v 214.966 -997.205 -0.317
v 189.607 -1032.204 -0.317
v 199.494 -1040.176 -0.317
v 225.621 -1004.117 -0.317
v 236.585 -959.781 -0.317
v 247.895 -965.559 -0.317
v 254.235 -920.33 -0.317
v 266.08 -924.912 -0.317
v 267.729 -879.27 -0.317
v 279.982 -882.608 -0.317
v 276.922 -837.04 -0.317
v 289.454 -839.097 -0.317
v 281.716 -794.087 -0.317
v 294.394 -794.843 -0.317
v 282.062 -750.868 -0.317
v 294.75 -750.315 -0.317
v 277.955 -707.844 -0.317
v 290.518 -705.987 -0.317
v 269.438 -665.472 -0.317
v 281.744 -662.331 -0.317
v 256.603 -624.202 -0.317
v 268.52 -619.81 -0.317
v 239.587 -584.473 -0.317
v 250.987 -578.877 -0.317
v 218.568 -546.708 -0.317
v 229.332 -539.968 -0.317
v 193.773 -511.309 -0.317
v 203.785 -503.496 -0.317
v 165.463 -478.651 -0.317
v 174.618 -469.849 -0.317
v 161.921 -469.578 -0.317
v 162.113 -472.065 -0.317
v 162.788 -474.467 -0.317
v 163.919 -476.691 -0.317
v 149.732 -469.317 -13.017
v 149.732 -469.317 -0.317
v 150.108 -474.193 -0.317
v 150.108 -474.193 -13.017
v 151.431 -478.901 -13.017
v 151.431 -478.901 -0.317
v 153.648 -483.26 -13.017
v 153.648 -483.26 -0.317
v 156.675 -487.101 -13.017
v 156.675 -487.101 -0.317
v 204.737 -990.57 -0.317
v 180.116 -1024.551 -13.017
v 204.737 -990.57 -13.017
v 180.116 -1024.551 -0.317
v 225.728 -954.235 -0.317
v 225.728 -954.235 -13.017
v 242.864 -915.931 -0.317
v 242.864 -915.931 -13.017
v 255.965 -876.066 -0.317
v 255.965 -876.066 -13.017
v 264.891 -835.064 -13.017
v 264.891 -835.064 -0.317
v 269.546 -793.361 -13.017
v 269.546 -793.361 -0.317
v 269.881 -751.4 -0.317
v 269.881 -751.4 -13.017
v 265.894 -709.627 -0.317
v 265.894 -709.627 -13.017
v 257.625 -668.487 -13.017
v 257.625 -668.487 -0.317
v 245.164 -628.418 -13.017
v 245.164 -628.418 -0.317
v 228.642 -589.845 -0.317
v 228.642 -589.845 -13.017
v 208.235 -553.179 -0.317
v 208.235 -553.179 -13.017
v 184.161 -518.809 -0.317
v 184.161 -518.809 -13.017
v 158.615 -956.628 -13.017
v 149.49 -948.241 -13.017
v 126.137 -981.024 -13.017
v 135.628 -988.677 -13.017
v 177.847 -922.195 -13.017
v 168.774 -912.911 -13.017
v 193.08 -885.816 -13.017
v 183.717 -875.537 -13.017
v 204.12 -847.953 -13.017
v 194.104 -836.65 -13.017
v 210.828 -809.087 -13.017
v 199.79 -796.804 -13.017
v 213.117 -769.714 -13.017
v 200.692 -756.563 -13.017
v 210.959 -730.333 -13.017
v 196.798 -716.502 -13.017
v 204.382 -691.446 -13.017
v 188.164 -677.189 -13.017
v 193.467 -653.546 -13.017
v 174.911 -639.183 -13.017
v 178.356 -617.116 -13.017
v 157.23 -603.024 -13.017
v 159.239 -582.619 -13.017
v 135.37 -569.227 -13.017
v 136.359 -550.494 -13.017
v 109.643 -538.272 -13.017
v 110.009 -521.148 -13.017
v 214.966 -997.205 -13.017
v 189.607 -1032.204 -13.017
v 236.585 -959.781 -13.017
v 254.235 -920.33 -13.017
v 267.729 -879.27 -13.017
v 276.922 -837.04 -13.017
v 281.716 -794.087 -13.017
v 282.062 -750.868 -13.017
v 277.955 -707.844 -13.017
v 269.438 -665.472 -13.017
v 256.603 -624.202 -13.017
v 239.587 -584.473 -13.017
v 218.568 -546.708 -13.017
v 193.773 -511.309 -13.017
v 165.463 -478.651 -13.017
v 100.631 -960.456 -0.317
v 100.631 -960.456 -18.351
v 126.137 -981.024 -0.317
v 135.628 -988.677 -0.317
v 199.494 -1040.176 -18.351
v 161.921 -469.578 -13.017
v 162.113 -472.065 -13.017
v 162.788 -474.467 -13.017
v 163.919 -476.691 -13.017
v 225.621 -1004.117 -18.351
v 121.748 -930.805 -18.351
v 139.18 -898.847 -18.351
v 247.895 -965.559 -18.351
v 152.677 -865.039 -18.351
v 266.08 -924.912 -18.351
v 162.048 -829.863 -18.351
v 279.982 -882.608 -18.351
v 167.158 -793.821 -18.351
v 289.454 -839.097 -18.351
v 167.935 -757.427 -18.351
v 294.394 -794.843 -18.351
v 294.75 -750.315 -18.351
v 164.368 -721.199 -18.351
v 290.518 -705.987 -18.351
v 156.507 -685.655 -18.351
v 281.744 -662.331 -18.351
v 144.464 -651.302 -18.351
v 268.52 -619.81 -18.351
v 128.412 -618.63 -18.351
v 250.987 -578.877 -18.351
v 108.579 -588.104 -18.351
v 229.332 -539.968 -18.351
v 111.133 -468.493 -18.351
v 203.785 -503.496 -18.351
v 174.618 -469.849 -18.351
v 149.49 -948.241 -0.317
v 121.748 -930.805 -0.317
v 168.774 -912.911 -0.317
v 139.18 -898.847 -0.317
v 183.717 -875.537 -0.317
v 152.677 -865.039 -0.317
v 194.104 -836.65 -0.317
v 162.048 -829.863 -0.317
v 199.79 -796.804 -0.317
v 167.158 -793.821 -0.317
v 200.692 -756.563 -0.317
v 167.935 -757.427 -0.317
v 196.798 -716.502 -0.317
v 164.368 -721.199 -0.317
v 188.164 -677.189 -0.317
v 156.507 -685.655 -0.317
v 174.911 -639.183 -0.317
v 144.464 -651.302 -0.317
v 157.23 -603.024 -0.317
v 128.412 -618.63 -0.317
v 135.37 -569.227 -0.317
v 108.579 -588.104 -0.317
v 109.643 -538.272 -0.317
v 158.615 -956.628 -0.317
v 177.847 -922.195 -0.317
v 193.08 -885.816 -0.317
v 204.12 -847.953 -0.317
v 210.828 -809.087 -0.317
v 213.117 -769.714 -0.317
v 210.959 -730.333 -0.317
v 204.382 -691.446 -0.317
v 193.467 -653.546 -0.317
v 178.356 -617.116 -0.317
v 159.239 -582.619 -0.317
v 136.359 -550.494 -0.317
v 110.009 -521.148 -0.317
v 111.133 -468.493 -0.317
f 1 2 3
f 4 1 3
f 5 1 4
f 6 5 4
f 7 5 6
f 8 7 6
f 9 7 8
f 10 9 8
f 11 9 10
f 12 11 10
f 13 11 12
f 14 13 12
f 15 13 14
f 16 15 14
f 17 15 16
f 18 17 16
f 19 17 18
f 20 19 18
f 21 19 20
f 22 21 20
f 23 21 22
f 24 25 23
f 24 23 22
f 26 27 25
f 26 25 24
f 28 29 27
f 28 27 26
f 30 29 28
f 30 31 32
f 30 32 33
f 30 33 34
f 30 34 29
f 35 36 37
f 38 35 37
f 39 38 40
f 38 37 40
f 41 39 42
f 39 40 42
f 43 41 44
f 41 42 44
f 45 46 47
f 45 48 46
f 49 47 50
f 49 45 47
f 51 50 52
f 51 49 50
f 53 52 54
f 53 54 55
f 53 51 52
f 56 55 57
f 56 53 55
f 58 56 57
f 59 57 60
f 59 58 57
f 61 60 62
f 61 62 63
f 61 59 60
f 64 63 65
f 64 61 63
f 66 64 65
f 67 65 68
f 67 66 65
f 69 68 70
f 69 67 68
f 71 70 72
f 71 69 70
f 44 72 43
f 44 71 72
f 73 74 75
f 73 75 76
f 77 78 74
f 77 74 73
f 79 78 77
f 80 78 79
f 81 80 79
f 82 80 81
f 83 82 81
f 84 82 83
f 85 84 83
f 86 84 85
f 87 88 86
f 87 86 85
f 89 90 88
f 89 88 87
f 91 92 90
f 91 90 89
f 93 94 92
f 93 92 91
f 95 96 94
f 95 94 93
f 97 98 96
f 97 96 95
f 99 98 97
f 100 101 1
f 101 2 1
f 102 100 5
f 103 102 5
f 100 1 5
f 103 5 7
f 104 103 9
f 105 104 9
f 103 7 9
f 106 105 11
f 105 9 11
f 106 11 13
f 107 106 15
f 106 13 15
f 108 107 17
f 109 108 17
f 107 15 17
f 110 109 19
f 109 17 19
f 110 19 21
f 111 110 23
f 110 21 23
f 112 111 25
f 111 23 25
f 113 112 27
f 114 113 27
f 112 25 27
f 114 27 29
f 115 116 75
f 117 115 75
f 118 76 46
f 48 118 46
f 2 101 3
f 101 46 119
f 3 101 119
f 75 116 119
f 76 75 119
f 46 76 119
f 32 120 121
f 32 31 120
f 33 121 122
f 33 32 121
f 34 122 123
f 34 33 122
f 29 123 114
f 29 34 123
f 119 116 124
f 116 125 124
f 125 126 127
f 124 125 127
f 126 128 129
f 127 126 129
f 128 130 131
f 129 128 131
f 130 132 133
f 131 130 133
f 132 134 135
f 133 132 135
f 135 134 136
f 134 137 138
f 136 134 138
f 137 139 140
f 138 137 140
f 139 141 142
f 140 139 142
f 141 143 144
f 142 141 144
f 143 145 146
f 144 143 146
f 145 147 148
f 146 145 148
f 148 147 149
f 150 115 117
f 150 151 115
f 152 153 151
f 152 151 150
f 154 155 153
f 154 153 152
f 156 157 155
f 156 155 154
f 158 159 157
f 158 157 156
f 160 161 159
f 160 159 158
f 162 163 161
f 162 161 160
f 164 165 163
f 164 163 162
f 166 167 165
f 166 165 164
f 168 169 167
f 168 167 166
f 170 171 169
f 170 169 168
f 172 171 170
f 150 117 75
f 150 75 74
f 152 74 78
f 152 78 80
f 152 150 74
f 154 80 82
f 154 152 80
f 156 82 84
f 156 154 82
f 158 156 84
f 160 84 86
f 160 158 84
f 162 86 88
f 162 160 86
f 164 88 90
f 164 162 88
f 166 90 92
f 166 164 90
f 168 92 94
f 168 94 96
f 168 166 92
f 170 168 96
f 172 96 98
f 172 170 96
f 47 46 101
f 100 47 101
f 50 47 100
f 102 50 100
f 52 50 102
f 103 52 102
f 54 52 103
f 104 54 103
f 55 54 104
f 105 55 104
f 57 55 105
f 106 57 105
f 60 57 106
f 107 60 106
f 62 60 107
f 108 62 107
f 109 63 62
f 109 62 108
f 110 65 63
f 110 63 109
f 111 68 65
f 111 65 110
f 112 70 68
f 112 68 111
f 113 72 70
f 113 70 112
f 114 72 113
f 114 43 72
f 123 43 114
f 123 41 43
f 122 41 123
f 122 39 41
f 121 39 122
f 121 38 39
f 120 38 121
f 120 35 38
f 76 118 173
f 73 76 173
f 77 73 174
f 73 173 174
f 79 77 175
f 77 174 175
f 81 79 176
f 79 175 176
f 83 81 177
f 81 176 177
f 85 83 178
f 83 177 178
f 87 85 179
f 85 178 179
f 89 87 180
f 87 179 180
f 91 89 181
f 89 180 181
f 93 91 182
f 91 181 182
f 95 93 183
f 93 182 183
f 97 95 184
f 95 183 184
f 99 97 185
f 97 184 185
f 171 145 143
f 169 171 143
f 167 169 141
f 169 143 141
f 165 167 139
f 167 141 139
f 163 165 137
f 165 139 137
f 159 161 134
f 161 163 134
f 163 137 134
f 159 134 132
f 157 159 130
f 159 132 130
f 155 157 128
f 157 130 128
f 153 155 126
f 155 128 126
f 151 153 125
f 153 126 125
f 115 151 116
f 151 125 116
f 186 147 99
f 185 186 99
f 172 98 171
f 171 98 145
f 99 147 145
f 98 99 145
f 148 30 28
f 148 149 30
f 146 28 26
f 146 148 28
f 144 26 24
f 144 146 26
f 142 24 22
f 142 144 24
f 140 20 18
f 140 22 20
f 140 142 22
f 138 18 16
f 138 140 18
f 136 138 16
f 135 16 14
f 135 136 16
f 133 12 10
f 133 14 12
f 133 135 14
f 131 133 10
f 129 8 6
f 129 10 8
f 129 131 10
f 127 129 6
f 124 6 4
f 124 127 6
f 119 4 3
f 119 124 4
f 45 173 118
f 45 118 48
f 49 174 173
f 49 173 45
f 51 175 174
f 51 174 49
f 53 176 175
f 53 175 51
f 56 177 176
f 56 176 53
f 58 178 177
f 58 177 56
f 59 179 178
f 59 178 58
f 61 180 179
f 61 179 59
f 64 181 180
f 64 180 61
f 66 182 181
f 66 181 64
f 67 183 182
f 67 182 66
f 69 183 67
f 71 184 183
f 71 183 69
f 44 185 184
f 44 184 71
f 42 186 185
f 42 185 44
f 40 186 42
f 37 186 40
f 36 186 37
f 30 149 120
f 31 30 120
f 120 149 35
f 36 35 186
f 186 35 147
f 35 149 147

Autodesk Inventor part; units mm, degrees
ref_plane "YZ Plane" through (0, 0, 0) normal (1, 0, 0) x (0, 1, 0)
ref_plane "XZ Plane" through (0, 0, 0) normal (0, 1, 0) x (-1, 0, 0)
ref_plane "Work Plane1" through (22.5184, 2.463, -18.3509) normal (0, 0, 1) x (0.9997722, -0.0213418, 0)
sketch "ThermoBulbBorder" plane through (22.5184, 2.463, -18.3509) normal (0, 0, 1) x (0.9997722, -0.0213418, 0)
  arc A0 (-447.455, -468.958) -> (162.145, -468.958) centre (-142.655, -774.8145) ccw
  arc A1 (-447.455, -468.958) -> (162.145, -468.958) centre (-142.655, -774.8145) ccw
  arc A2 (-383.955, -588.5959) -> (98.645, -588.5959) centre (-142.655, -774.8145) ccw
  line L0 (-447.455, -468.958) -> (-383.955, -468.958)
  line L1 (-383.955, -468.958) -> (-383.955, -588.5959)
  line L2 (162.145, -468.958) -> (98.645, -468.958)
  line L3 (98.645, -468.958) -> (98.645, -588.5959)
  line L4 (-383.955, -961.033) -> (-484.4967, -1038.6241)
  line L5 (98.645, -961.033) -> (199.1867, -1038.6241)
  arc A3 (-447.455, -468.958) -> (162.145, -468.958) centre (-142.655, -774.8145) ccw projected
  circle A4 centre (-142.655, -774.8145) radius 419.1 construction
  circle A5 centre (-142.655, -774.8145) radius 410.972 construction
  circle A6 centre (-142.655, -774.8145) radius 353.822 construction
  circle A7 centre (-142.655, -774.8145) radius 345.694 construction
  line L6 (98.645, -468.958) -> (98.645, -316.558) construction
  line L7 (-383.955, -468.958) -> (-383.955, -316.558) construction
  dimension "d0" = 609.6
  dimension "d5" = 63.5
  dimension "d6" = 63.5
  dimension "d7" = 838.2
  dimension "d8" = 8.128
  dimension "d9" = 8.128
  dimension "d10" = 57.15
  dimension "d11" = 40.894
  dimension "d12" = 152.4
extrude "Extrusion3" add sketch "ThermoBulbBorder" along normal blind 18.034 contours L5 A2 L3 L2 A0
sketch "Sketch2" plane through (22.5184, 2.463, -0.3169) normal (0, 0, 1) x (0.9997722, -0.0213418, 0)
  line L0 (149.445, -468.958) -> (137.253, -468.958)
  arc A0 (199.1867, -1038.6241) -> (162.145, -468.958) centre (-142.655, -774.8145) ccw projected
  arc A1 (124.5847, -981.0515) -> (98.645, -538.7528) centre (-142.655, -774.8145) ccw
  arc A2 (134.2367, -988.5003) -> (98.645, -521.6249) centre (-142.655, -774.8145) ccw
  arc A3 (179.4805, -1023.4163) -> (144.5742, -486.5897) centre (-142.655, -774.8145) ccw
  arc A4 (189.1325, -1030.865) -> (153.1803, -477.9538) centre (-142.655, -774.8145) ccw
  line L1 (162.145, -468.958) -> (98.645, -468.958) projected
  line L2 (98.645, -961.033) -> (199.1867, -1038.6241) projected
  line L3 (98.645, -538.7528) -> (98.645, -521.6249)
  line L4 (98.645, -468.958) -> (98.645, -588.5959) projected
  line L5 (124.5847, -981.0515) -> (134.2367, -988.5003)
  line L6 (179.4805, -1023.4163) -> (189.1325, -1030.865)
  line L7 (149.445, -468.958) -> (149.445, -443.558) construction
  arc A5 (149.445, -468.958) -> (153.1803, -477.9538) centre (162.145, -468.958) ccw
  line L8 (137.253, -468.958) -> (137.253, -443.558) construction
  arc A6 (137.253, -468.958) -> (144.5742, -486.5897) centre (162.145, -468.958) ccw
  point P0 (-22.4607, -2.943)
  dimension "d17" = 12.7
  dimension "bRopeChannel" = 12.192
  dimension "d19" = 12.192
  dimension "d20" = 57.15
  dimension "d23" = 12.7
  dimension "d24" = 25.4
  dimension "d25" = 12.192
extrude "Extrusion4" cut sketch "Sketch2" against normal blind 12.7 contours A5 A4 L2 A3 A6 L0 | A2 L2 A1 L3
equation "\"d6\" = d5"
equation "\"d8\" = sRopeChannel"
equation "\"d9\" = sRopeChannel"
equation "\"d19\" = bRopeChannel"
equation "\"d23\" = d17"
equation "\"sRopeChannel\" = 8.128"
properties part number "HOT Thermo bulb outline R" material "Rubber, Butyl"
